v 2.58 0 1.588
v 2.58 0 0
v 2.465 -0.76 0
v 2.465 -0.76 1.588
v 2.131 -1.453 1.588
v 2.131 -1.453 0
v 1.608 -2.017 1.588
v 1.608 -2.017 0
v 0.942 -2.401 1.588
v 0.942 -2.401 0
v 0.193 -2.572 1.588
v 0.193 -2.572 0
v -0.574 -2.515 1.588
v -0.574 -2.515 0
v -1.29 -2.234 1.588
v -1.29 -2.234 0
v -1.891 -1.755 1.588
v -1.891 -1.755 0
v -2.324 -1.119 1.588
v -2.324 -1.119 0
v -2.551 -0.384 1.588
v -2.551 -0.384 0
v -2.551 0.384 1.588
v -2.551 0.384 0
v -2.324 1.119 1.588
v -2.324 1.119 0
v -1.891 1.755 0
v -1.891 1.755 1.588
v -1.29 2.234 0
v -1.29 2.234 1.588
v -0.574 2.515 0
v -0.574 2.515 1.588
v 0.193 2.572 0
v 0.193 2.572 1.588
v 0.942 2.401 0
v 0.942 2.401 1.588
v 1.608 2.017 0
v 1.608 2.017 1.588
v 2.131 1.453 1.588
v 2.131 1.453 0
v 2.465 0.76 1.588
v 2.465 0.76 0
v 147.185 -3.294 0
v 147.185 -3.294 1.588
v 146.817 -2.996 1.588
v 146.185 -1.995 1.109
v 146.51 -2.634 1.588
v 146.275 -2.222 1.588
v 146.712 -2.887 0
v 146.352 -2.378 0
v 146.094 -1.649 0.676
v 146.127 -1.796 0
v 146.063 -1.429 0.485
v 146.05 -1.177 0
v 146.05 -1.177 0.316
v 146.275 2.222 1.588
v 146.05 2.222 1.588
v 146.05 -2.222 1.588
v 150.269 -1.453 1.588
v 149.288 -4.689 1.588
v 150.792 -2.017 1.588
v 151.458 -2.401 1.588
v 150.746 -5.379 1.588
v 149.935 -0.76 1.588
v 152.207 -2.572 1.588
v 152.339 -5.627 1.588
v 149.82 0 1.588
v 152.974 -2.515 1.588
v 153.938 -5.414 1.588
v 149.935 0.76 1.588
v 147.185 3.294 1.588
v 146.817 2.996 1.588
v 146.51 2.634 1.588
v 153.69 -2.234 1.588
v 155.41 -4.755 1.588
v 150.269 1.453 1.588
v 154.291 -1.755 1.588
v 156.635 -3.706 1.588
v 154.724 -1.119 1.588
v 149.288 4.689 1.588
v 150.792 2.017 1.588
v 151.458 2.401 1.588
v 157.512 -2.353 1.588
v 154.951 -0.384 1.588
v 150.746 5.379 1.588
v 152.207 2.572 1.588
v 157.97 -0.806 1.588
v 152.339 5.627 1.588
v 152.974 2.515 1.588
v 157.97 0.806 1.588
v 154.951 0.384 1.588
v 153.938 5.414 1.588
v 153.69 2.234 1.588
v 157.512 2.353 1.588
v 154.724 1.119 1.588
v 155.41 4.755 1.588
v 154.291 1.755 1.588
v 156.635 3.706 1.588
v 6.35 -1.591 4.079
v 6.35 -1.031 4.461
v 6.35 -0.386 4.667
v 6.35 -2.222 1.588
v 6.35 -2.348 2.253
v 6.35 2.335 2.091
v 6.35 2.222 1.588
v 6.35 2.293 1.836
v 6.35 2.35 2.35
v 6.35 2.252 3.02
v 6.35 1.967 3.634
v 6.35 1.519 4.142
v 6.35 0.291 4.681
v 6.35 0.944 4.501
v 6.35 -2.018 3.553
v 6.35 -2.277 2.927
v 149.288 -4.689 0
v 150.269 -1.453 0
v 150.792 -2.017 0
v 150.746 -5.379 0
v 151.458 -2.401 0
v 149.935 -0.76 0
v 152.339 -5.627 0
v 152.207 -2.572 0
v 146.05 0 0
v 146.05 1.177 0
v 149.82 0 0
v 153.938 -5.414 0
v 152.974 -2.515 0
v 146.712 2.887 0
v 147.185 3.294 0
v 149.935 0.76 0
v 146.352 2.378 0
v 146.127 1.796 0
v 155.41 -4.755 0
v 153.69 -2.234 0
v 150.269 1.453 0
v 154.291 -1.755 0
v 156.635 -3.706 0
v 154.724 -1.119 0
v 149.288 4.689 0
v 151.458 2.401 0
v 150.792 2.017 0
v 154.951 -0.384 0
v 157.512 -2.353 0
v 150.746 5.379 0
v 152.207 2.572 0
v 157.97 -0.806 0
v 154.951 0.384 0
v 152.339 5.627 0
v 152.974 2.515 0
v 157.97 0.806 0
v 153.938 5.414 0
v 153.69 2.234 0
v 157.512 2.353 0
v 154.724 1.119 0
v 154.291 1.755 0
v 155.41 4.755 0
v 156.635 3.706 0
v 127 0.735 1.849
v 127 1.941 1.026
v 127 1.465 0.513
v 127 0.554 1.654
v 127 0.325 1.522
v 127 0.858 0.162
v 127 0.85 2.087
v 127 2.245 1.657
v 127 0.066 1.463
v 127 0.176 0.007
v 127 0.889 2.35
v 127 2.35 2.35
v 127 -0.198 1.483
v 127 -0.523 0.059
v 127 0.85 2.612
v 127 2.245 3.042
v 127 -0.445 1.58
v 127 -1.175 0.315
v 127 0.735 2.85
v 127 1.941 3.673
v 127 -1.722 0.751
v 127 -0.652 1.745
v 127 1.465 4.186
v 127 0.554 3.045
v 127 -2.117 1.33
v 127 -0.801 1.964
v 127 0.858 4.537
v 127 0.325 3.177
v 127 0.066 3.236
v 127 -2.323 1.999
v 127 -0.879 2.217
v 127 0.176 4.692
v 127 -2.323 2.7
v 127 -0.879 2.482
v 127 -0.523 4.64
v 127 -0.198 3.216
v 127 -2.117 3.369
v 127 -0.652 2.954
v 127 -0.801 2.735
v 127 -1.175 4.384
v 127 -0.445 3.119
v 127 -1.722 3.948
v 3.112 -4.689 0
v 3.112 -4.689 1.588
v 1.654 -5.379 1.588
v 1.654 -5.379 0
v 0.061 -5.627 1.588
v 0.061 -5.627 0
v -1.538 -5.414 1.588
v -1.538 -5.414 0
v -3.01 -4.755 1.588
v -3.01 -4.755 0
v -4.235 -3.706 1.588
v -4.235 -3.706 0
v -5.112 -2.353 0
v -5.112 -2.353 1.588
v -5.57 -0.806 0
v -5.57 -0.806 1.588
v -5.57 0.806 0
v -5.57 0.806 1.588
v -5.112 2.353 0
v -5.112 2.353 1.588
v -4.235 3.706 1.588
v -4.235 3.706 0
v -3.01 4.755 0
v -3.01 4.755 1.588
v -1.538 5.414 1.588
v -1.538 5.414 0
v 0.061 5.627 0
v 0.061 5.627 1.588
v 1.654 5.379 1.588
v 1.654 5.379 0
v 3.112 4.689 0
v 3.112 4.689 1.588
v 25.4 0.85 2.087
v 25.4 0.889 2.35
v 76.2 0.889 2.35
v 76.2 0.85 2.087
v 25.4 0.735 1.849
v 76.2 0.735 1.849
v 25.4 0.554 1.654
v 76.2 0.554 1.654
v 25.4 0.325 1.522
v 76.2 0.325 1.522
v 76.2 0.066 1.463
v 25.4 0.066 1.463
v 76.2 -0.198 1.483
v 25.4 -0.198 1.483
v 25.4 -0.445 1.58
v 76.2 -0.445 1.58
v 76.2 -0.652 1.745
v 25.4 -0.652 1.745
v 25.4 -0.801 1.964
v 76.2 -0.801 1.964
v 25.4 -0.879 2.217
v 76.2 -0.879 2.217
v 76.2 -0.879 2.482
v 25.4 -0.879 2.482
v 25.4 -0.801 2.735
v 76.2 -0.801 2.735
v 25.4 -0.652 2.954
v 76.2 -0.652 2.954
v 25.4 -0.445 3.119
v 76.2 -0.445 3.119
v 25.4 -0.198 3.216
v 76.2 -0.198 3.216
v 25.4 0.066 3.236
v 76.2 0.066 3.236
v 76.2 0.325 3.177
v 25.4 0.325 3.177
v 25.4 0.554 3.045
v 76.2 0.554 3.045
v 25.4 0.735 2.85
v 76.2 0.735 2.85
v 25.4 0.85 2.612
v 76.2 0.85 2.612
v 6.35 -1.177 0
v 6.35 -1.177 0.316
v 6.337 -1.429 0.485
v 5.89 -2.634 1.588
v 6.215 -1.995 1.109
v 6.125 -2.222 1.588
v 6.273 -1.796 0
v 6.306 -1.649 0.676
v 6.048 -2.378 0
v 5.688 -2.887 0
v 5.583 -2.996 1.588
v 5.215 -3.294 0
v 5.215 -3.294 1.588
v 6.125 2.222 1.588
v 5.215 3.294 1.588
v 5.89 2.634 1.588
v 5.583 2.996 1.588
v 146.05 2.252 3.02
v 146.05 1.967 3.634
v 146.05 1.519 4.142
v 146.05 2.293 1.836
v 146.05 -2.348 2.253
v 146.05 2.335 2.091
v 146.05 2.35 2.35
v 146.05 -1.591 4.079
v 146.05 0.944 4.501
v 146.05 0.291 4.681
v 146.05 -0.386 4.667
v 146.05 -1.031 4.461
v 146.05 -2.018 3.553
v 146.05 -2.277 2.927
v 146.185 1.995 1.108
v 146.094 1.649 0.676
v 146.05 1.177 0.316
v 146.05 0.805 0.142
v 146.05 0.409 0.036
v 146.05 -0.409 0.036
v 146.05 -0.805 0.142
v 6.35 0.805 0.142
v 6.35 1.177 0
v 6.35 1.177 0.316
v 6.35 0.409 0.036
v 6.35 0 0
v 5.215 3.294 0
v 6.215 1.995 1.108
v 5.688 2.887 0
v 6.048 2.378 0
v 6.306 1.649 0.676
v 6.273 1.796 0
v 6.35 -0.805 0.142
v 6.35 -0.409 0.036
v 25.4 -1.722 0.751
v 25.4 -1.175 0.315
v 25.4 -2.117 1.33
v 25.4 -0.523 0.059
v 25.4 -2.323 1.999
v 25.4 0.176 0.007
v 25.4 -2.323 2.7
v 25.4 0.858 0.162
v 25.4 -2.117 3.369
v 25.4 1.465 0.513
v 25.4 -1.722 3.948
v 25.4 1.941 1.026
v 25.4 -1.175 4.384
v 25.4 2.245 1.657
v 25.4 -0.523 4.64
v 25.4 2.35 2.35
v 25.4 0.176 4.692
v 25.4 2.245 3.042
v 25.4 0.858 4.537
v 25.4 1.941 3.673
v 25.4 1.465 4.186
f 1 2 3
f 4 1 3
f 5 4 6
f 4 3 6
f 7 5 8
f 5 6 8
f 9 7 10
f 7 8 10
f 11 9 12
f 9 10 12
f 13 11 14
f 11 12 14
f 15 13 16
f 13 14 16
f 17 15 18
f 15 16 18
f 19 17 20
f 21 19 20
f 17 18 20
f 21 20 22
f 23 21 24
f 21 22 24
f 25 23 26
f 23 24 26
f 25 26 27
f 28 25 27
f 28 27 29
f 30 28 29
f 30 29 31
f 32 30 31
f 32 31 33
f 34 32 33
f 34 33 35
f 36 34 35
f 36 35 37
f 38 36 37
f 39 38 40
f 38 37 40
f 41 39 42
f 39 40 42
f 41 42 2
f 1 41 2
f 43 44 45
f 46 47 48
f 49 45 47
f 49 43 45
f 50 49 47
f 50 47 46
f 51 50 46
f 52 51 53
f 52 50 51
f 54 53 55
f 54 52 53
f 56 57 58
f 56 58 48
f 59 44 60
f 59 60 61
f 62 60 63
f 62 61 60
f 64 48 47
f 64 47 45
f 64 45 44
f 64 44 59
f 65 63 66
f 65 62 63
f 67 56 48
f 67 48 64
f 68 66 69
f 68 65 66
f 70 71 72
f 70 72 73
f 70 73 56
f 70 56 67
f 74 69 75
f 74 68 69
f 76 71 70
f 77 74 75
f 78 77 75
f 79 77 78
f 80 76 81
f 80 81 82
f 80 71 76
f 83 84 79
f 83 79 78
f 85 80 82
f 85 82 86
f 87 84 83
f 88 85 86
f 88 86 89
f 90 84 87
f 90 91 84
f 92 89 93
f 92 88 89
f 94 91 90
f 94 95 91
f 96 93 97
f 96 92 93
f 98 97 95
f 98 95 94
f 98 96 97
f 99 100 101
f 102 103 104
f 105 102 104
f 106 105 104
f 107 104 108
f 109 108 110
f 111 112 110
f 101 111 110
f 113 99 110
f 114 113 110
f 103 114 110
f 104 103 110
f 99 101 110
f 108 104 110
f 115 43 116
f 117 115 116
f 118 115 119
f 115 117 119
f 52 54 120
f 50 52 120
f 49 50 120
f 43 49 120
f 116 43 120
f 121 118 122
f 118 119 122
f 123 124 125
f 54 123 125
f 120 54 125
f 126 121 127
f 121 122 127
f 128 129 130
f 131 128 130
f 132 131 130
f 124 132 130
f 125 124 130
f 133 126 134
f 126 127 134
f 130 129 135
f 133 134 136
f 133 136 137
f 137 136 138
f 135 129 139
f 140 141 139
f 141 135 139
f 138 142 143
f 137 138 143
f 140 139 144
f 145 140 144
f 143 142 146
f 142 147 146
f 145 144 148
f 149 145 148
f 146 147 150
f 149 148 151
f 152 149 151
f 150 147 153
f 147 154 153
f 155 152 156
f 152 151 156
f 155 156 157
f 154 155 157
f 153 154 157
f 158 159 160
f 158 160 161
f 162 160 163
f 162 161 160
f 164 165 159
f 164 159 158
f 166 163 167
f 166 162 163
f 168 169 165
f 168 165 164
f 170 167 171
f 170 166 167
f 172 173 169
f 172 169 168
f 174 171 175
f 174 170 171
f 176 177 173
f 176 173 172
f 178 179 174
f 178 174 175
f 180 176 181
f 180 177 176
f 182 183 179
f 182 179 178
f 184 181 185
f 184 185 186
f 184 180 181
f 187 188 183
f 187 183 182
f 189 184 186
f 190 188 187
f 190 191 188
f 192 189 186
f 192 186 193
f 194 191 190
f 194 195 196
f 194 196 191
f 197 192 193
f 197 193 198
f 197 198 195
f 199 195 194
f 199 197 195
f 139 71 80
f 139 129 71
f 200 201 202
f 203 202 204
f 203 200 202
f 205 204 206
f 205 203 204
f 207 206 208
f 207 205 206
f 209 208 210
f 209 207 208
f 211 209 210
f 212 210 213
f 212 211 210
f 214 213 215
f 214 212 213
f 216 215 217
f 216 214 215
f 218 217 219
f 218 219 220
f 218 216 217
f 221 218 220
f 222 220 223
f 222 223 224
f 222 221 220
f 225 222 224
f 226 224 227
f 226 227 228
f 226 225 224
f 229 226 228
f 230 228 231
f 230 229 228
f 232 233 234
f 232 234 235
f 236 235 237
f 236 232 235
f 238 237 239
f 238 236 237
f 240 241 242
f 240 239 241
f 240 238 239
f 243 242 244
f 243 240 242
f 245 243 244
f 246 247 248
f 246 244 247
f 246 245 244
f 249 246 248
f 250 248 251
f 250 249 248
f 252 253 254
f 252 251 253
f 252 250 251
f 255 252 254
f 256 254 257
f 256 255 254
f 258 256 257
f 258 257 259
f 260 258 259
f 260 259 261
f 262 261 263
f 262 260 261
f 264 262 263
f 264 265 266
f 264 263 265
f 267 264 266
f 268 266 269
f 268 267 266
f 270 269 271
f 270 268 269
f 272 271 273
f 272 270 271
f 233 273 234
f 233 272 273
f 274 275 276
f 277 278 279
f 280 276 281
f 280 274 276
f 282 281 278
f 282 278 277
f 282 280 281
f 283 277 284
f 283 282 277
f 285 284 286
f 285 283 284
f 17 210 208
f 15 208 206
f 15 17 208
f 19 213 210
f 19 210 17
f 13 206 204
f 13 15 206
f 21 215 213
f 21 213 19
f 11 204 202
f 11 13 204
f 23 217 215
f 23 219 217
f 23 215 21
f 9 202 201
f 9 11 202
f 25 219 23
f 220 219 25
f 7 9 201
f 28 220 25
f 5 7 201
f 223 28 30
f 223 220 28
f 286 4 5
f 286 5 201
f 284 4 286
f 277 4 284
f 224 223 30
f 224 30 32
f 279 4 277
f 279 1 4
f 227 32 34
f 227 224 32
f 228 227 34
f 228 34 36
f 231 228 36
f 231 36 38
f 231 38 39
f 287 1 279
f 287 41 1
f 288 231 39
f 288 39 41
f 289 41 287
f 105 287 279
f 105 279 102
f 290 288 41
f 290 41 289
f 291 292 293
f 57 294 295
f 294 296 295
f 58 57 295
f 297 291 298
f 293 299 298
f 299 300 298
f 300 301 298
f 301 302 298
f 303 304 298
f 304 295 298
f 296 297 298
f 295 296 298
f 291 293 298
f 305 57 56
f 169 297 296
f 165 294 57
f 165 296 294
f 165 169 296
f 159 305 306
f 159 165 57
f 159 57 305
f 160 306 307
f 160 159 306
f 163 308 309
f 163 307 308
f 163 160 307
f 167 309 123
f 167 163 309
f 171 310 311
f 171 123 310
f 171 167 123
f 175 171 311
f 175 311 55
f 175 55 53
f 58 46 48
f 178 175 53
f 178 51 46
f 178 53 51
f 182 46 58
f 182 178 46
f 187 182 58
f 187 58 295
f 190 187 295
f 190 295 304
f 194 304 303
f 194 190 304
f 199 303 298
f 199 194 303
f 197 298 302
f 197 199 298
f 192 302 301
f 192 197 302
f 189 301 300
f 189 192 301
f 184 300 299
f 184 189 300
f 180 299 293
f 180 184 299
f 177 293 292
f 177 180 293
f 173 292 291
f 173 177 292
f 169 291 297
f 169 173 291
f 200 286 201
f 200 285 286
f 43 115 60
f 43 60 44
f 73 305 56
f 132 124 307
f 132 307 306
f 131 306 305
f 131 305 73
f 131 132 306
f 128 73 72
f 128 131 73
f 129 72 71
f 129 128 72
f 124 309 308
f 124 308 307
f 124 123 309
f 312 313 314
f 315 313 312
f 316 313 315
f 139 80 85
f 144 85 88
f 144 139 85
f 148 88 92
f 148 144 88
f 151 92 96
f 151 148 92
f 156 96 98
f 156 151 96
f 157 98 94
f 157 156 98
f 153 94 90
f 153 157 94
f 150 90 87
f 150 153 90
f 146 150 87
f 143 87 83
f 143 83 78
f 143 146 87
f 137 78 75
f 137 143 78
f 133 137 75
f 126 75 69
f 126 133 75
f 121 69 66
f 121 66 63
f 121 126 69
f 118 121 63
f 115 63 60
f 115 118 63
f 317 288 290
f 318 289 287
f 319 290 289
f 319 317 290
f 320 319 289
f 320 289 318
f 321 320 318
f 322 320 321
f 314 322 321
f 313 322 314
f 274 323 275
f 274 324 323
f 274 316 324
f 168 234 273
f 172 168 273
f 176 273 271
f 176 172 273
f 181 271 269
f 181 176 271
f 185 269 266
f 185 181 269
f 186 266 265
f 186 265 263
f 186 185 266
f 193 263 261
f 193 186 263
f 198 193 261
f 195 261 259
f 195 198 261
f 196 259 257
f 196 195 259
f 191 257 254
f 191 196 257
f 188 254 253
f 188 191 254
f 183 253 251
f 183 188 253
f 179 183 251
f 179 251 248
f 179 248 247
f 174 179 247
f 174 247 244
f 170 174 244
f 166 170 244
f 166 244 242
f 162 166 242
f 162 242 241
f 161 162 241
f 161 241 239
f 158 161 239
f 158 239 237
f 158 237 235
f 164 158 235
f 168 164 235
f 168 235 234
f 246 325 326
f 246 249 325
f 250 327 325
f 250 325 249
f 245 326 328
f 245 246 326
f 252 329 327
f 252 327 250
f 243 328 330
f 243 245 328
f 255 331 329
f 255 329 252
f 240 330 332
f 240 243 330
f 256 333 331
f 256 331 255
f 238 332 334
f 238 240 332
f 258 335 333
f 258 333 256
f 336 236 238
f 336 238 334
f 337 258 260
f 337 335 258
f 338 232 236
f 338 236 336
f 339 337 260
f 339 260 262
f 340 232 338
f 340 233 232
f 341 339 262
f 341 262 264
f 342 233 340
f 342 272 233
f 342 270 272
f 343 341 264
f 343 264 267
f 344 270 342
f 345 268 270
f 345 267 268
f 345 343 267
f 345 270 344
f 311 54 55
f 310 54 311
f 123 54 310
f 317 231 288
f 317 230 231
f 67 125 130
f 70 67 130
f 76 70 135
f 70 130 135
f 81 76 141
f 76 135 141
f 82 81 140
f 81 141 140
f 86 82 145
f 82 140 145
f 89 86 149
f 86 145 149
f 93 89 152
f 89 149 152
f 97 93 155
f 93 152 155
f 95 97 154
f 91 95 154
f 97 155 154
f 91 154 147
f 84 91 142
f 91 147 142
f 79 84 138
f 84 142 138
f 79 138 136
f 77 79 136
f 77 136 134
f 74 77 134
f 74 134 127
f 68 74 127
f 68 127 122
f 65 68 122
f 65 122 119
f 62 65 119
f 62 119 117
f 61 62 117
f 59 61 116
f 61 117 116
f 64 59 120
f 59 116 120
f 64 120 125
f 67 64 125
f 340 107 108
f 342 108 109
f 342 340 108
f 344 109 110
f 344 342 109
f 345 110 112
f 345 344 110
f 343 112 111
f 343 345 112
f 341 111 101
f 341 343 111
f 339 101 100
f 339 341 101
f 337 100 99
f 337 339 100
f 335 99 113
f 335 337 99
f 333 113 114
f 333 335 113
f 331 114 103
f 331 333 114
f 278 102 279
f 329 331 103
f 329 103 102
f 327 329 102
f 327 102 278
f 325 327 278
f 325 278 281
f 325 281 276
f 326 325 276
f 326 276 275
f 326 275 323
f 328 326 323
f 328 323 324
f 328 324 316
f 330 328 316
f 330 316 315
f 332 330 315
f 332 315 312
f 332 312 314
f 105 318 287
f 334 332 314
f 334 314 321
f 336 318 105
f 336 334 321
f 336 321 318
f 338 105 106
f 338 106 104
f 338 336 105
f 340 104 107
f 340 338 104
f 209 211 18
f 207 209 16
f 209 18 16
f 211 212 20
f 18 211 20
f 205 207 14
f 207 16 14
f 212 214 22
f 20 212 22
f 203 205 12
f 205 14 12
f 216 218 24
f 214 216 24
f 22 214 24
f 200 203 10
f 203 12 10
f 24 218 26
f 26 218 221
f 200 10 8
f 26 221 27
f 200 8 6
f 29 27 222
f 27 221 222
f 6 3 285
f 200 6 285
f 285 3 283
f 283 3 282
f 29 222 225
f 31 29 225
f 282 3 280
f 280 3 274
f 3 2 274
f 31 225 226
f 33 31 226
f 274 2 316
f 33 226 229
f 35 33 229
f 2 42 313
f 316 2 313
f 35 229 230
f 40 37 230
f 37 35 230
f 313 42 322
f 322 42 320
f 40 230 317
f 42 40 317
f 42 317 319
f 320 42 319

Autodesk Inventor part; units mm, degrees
ref_plane "XZ Plane" through (0, 0, 0) normal (0, 1, 0) x (-1, 0, 0)
sketch "Sketch1" plane through (0, 0, 0) normal (0, 0, 1) x (1, 0, 0)
  line L0 (0, 7.8788) -> (0, -7.8788) projected
  line L1 (-8.0232, 0) -> (8.7455, 0) projected
  circle A0 centre (0, 0) radius 2.5797
  circle A1 centre (0, 0) radius 5.6277
  line L2 (3.1119, 4.689) -> (6.35, 2.54)
  line L3 (6.35, 2.54) -> (6.35, -2.54)
  line L4 (6.35, -2.54) -> (3.1119, -4.689)
  dimension "d0" = 5.1594
  dimension "d1" = 3.048
  dimension "d8" = 6.35
  dimension "d9" = 5.08
extrude "Extrusion1" add sketch "Sketch1" along normal blind 1.5875 contours A1 L1 A0 L0 | L0 A0 L1 A1 | L2 L3 L1 A1 | L1 A0 L0 A1 | L1 A1 L0 A0 | L1 L3 L4 A1
sketch "Sketch2" plane through (0, 0, 0) normal (1, 0, 0) x (0, 1, 0)
  point P0 (0, 0)
ref_plane "Work Plane1" through (25.4, 0, 0) normal (1, 0, 0) x (0, 1, 0)
sketch "Sketch3" plane through (25.4, 0, 0) normal (1, 0, 0) x (0, 1, 0)
  circle A0 centre (0, 2.3495) radius 2.3495
  circle A1 centre (0, 2.3495) radius 0.762
  line L0 (5.6277, 1.5875) -> (-5.6277, 1.5875) projected
  point P0 (0, 0)
  dimension "d5" = 1.524
extrude "Extrusion2" add sketch "Sketch3" against normal blind 19.05 contours A1 | A0 L0 | L0 A0
fillet "Fillet1" radius 2.54 2 edges at (6.35, 2.54, 0.7937) (6.35, -2.54, 0.7937)
sketch "Sketch4" plane through (25.4, 0, 0) normal (1, 0, 0) x (0, 1, 0)
  circle A0 centre (0, 2.3495) radius 2.3495 projected
  circle A1 centre (0, 2.3495) radius 0.889
  point P0 (0, 0)
  dimension "d11" = 1.778
ref_plane "Work Plane2" through (76.2, 0, 0) normal (1, 0, 0) x (0, 1, 0)
extrude "Extrusion3" add sketch "Sketch4" along normal up to surface (50.8 mm away) contours A1
mirror "Mirror1" about plane through (76.2, 0, 0) normal (1, 0, 0) of "Extrusion3", "Extrusion2", "Fillet1", "Extrusion1"
